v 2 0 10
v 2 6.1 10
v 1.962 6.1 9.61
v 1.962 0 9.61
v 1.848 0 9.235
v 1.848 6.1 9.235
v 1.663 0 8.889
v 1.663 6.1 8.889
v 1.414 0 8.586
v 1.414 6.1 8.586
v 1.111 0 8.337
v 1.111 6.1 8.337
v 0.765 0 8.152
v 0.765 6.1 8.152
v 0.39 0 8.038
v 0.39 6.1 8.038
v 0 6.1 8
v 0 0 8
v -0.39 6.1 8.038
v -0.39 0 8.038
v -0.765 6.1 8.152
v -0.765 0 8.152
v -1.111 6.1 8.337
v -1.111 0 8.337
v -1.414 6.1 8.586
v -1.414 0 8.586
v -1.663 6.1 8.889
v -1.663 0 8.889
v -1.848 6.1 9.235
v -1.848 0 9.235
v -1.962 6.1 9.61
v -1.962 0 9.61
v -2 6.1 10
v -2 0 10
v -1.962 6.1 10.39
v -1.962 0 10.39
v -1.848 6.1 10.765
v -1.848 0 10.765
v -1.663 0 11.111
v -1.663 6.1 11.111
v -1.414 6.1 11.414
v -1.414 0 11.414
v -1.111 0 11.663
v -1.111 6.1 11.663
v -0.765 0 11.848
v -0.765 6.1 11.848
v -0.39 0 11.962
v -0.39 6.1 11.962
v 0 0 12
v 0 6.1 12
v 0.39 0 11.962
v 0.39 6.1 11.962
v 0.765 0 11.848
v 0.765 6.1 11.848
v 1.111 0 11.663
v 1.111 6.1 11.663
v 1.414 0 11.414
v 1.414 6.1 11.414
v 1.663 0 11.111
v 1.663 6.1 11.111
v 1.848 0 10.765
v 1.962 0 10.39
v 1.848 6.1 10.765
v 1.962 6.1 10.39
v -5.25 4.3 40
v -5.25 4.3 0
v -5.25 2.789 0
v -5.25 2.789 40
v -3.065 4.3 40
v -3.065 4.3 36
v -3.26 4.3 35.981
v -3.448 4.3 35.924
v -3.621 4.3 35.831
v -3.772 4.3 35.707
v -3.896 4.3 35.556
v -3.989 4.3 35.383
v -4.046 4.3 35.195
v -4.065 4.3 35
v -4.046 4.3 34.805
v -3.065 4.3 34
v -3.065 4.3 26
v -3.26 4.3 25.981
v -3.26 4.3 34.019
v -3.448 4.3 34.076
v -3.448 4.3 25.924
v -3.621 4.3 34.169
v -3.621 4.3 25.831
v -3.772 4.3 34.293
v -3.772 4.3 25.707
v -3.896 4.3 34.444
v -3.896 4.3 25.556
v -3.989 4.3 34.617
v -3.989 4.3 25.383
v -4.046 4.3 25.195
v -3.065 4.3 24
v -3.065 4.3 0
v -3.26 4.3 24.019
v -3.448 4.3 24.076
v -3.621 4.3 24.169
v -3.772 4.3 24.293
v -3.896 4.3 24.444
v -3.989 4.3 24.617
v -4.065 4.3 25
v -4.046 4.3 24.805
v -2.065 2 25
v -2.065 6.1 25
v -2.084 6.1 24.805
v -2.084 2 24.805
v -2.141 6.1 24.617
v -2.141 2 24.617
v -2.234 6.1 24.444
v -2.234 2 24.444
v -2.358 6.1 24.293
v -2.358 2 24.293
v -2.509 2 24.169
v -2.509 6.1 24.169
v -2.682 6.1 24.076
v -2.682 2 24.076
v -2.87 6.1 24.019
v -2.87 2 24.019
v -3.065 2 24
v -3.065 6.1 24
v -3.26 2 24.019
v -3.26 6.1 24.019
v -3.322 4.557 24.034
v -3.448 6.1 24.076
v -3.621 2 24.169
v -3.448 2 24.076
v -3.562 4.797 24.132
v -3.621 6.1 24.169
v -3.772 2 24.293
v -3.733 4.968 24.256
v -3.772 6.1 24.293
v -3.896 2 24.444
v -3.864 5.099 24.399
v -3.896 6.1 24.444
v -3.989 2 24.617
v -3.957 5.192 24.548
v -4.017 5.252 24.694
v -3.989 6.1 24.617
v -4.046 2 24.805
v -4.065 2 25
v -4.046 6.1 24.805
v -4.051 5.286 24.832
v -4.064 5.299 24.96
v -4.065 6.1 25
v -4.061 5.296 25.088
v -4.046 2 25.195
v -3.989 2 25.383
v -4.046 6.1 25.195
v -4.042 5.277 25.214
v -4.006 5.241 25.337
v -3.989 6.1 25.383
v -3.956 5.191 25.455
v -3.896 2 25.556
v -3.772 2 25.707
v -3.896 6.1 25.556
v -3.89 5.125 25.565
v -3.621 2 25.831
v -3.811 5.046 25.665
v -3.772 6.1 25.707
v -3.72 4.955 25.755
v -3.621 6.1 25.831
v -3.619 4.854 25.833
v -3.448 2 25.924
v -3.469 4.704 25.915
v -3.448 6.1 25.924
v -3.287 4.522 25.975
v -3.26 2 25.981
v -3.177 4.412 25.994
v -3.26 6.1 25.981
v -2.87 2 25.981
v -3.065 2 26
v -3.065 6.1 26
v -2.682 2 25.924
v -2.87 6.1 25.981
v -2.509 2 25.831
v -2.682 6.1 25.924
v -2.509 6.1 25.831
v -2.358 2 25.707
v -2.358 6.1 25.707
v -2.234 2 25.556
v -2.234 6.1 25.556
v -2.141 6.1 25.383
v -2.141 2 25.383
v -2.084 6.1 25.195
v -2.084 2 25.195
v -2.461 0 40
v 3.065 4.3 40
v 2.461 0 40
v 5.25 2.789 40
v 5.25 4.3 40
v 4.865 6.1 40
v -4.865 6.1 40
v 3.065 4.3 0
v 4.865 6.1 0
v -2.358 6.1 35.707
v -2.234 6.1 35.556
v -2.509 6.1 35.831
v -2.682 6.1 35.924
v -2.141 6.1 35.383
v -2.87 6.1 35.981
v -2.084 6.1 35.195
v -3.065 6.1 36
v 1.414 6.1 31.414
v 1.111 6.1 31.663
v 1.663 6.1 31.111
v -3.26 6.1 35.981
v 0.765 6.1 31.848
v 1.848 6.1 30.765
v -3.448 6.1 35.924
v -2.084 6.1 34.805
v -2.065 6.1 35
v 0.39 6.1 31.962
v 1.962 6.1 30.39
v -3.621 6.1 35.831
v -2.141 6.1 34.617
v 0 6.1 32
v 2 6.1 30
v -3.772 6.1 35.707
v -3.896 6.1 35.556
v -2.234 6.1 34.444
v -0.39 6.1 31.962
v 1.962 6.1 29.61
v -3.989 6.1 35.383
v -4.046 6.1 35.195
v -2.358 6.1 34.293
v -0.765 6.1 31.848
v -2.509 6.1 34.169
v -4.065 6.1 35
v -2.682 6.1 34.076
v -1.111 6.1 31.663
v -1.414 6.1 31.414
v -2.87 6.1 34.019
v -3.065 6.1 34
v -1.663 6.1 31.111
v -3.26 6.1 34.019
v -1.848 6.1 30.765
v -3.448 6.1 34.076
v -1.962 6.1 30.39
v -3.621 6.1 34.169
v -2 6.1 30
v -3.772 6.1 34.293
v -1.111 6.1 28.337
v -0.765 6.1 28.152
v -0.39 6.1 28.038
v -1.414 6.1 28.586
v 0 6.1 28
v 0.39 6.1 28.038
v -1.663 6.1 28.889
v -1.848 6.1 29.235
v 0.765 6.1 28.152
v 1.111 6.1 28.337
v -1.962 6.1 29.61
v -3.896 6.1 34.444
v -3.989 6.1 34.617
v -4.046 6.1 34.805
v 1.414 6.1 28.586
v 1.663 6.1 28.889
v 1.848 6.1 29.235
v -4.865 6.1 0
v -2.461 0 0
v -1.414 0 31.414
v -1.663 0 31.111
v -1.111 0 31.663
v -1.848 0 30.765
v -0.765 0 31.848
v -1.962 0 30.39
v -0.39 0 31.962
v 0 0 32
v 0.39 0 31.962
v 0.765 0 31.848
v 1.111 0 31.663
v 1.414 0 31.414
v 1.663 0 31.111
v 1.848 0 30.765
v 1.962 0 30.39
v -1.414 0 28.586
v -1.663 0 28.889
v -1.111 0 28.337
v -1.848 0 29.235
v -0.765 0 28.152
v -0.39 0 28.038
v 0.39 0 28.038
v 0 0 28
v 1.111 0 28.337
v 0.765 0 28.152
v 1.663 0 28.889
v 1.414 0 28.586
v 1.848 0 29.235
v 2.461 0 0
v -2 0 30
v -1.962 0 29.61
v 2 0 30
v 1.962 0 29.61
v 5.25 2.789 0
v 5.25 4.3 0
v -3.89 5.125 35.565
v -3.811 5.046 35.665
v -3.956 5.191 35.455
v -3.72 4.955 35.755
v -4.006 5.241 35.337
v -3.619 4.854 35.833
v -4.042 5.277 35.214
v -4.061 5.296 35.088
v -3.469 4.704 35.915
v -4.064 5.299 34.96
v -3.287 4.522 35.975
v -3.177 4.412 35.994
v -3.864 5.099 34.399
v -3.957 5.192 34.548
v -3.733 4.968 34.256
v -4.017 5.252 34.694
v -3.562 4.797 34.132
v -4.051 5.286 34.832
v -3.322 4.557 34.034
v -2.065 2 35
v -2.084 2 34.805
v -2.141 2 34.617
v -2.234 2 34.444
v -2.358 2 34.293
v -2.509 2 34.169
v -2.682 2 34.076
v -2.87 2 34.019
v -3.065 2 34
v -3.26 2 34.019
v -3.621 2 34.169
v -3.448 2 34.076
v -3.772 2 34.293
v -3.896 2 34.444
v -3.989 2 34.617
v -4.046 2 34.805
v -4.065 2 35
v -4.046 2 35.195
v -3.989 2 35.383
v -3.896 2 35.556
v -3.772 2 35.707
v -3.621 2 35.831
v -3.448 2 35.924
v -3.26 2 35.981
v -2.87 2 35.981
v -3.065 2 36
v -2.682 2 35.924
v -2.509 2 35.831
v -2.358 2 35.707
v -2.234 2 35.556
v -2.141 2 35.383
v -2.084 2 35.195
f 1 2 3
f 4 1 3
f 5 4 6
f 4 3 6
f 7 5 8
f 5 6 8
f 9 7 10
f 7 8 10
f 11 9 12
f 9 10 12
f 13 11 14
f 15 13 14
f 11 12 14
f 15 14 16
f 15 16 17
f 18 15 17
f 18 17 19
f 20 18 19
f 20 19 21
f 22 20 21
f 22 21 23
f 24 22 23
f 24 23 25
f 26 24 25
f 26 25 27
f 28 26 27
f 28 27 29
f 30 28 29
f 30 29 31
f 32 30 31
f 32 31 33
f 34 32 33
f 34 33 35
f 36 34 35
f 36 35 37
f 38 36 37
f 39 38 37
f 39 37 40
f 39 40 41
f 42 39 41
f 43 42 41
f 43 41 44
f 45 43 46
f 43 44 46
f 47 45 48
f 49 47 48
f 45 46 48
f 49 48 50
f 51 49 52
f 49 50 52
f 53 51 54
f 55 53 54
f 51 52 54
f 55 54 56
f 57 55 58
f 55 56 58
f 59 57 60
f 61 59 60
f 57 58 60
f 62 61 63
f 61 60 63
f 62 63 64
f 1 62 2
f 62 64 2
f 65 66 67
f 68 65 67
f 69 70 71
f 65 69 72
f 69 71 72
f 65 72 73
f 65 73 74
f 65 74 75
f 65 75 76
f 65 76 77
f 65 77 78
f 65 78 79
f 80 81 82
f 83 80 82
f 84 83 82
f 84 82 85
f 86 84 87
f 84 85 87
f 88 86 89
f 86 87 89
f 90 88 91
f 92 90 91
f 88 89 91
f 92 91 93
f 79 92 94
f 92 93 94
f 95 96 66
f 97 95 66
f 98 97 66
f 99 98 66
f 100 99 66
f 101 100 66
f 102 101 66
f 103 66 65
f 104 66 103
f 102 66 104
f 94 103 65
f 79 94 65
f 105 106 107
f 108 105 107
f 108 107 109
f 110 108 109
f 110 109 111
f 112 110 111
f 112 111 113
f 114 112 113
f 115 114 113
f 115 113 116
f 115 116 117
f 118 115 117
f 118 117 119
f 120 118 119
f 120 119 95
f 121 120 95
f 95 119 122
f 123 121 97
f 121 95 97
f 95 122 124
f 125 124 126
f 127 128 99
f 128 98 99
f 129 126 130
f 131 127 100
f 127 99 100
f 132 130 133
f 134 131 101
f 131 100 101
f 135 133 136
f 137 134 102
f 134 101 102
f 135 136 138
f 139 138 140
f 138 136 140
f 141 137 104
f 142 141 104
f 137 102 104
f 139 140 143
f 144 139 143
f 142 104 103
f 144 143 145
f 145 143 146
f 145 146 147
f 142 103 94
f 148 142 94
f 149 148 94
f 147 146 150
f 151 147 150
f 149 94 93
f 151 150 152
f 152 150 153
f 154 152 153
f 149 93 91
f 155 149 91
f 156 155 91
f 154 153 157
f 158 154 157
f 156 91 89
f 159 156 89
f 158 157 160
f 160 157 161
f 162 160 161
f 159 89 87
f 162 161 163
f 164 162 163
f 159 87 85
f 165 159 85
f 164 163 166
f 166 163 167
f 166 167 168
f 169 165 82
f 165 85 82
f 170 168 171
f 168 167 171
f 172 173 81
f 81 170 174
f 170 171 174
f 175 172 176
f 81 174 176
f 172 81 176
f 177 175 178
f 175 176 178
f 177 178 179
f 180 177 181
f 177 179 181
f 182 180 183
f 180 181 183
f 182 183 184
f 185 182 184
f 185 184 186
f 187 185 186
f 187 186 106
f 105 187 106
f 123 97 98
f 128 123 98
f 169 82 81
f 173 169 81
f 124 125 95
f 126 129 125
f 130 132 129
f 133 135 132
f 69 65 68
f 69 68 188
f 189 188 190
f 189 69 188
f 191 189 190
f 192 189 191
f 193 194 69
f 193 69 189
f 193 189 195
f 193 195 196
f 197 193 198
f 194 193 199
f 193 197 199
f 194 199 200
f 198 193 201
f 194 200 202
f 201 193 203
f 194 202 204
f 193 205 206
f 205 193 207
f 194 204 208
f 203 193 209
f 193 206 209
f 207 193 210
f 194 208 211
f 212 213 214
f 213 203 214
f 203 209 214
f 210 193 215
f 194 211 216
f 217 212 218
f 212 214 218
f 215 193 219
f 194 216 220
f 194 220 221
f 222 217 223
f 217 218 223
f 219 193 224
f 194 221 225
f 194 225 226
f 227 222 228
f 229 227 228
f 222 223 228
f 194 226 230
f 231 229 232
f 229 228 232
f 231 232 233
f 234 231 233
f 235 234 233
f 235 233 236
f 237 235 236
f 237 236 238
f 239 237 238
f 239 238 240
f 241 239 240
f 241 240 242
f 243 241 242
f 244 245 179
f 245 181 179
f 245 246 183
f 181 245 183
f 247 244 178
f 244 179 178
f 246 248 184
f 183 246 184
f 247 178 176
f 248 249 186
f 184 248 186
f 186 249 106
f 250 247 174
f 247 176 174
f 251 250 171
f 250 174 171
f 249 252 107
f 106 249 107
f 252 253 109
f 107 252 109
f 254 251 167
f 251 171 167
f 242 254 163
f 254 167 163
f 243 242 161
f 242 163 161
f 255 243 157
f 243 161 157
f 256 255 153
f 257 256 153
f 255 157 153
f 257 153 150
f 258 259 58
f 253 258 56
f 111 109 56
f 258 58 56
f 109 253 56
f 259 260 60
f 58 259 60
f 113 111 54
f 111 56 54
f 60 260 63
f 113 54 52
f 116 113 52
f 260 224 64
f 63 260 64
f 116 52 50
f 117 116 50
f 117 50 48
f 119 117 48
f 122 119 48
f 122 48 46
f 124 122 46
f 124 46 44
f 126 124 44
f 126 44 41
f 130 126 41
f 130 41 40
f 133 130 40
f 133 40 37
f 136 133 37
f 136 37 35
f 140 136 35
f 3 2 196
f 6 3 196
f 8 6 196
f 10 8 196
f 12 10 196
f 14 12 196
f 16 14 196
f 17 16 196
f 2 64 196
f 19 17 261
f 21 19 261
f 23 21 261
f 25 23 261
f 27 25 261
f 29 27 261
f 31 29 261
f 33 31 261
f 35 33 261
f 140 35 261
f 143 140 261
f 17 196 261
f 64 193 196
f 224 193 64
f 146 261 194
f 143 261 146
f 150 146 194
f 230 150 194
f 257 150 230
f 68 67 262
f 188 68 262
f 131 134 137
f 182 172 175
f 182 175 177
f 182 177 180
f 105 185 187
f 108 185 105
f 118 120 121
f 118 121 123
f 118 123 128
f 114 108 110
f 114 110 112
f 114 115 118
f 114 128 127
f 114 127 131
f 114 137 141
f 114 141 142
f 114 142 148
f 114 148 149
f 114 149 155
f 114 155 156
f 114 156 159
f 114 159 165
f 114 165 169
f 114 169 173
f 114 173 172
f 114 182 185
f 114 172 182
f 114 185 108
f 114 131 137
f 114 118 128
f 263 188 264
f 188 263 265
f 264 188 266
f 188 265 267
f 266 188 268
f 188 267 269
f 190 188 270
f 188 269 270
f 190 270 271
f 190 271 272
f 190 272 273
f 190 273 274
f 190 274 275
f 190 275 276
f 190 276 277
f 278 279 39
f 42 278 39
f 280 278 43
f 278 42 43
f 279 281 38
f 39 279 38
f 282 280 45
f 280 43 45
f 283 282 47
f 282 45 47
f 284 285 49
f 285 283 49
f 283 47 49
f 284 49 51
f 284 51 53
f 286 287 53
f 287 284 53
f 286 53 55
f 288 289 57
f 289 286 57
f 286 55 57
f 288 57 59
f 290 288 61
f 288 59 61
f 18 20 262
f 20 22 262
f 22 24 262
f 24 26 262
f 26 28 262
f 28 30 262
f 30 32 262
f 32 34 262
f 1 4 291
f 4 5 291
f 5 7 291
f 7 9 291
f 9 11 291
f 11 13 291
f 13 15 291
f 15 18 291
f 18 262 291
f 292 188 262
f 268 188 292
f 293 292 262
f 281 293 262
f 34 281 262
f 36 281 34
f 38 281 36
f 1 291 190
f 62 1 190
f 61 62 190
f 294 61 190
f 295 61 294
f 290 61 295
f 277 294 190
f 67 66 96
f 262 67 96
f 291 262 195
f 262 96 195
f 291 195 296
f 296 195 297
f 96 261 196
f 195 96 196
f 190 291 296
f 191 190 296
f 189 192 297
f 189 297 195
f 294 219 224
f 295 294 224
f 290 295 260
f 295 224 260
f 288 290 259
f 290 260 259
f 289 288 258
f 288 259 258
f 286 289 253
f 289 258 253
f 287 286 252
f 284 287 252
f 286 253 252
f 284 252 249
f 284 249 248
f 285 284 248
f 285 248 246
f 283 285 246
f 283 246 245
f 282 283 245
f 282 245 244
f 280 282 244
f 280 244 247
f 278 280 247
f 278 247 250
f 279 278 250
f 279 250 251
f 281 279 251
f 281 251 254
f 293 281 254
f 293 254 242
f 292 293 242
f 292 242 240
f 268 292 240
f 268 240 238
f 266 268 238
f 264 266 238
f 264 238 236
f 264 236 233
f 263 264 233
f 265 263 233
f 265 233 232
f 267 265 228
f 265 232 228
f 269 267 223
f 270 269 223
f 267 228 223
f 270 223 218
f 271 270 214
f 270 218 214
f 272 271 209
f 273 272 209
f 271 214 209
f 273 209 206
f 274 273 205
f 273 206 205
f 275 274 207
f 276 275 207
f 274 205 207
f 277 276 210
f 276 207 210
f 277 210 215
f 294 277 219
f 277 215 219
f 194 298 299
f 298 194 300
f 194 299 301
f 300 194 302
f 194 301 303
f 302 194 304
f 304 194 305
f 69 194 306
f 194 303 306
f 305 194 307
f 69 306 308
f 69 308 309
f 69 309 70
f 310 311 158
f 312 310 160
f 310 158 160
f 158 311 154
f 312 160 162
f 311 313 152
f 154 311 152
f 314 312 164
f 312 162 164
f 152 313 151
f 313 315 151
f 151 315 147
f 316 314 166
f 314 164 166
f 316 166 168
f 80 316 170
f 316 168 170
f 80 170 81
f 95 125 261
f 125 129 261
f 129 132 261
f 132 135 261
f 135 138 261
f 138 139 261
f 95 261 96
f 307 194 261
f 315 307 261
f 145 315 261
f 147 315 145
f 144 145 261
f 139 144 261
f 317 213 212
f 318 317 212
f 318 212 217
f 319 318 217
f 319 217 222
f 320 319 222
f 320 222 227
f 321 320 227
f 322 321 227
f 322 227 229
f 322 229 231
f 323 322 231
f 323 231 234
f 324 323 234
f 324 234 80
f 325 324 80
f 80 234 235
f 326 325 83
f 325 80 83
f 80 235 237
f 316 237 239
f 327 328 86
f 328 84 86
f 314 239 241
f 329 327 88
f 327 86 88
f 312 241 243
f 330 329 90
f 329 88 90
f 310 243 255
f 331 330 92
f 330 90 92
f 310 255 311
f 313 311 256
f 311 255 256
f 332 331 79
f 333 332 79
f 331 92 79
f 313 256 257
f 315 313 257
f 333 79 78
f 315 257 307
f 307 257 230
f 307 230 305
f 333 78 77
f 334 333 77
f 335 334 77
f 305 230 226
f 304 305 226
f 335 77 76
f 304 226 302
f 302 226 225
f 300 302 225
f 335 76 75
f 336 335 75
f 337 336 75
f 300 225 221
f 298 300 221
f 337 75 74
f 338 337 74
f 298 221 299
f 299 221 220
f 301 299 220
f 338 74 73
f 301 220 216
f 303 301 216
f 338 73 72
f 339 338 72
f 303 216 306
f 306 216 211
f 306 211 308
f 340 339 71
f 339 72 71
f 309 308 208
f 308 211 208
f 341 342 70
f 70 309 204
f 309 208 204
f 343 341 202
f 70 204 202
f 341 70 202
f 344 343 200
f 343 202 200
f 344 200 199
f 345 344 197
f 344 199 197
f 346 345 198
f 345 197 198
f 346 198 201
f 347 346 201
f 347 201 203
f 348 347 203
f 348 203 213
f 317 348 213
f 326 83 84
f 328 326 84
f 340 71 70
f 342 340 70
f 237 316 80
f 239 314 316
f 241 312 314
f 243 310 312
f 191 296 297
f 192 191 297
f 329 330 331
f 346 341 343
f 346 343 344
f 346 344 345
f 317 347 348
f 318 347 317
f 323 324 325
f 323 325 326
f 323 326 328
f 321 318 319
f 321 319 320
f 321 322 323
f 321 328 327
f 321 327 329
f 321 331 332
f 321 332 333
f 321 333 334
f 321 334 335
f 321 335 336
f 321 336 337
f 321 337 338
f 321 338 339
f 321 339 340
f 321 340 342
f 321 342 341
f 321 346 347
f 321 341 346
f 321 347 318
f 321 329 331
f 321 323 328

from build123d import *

# Parameters (mm, degrees)
BOSS_EXTRUDE1_DEPTH = 40
SKETCH2_R           = 2
CUT_EXTRUDE1_DEPTH  = 7.1
SKETCH9_R           = 1
CUT_EXTRUDE2_DEPTH  = 4.1


with BuildPart() as part:
    # Sketch1 → Boss-Extrude1 (new body)
    with BuildSketch(Plane.XY):
        Polygon((-2.460653528, 0), (2.460653528, 0), (5.25, 2.789346472), (5.25, 4.3), (3.065, 4.3), (4.865, 6.1), (-4.865, 6.1), (-3.065, 4.3), (-5.25, 4.3), (-5.25, 2.789346472), align=None)
    extrude(amount=BOSS_EXTRUDE1_DEPTH)

    # Sketch2 → Cut-Extrude1 (cut, through all)
    with BuildSketch(Plane(origin=(0, 6.1, 0), x_dir=(1, 0, 0), z_dir=(0, 1, 0))):
        with Locations((0, -30)):
            Circle(SKETCH2_R)
        with Locations((0, -10)):
            Circle(SKETCH2_R)
    extrude(amount=-CUT_EXTRUDE1_DEPTH, mode=Mode.SUBTRACT)

    # Sketch9 → Cut-Extrude2 (cut)
    with BuildSketch(Plane(origin=(0, 6.1, 0), x_dir=(1, 0, 0), z_dir=(0, 1, 0))):
        with Locations((-3.065, -35)):
            Circle(SKETCH9_R)
        with Locations((-3.065, -25)):
            Circle(SKETCH9_R)
    extrude(amount=-CUT_EXTRUDE2_DEPTH, mode=Mode.SUBTRACT)


solid = part.part
